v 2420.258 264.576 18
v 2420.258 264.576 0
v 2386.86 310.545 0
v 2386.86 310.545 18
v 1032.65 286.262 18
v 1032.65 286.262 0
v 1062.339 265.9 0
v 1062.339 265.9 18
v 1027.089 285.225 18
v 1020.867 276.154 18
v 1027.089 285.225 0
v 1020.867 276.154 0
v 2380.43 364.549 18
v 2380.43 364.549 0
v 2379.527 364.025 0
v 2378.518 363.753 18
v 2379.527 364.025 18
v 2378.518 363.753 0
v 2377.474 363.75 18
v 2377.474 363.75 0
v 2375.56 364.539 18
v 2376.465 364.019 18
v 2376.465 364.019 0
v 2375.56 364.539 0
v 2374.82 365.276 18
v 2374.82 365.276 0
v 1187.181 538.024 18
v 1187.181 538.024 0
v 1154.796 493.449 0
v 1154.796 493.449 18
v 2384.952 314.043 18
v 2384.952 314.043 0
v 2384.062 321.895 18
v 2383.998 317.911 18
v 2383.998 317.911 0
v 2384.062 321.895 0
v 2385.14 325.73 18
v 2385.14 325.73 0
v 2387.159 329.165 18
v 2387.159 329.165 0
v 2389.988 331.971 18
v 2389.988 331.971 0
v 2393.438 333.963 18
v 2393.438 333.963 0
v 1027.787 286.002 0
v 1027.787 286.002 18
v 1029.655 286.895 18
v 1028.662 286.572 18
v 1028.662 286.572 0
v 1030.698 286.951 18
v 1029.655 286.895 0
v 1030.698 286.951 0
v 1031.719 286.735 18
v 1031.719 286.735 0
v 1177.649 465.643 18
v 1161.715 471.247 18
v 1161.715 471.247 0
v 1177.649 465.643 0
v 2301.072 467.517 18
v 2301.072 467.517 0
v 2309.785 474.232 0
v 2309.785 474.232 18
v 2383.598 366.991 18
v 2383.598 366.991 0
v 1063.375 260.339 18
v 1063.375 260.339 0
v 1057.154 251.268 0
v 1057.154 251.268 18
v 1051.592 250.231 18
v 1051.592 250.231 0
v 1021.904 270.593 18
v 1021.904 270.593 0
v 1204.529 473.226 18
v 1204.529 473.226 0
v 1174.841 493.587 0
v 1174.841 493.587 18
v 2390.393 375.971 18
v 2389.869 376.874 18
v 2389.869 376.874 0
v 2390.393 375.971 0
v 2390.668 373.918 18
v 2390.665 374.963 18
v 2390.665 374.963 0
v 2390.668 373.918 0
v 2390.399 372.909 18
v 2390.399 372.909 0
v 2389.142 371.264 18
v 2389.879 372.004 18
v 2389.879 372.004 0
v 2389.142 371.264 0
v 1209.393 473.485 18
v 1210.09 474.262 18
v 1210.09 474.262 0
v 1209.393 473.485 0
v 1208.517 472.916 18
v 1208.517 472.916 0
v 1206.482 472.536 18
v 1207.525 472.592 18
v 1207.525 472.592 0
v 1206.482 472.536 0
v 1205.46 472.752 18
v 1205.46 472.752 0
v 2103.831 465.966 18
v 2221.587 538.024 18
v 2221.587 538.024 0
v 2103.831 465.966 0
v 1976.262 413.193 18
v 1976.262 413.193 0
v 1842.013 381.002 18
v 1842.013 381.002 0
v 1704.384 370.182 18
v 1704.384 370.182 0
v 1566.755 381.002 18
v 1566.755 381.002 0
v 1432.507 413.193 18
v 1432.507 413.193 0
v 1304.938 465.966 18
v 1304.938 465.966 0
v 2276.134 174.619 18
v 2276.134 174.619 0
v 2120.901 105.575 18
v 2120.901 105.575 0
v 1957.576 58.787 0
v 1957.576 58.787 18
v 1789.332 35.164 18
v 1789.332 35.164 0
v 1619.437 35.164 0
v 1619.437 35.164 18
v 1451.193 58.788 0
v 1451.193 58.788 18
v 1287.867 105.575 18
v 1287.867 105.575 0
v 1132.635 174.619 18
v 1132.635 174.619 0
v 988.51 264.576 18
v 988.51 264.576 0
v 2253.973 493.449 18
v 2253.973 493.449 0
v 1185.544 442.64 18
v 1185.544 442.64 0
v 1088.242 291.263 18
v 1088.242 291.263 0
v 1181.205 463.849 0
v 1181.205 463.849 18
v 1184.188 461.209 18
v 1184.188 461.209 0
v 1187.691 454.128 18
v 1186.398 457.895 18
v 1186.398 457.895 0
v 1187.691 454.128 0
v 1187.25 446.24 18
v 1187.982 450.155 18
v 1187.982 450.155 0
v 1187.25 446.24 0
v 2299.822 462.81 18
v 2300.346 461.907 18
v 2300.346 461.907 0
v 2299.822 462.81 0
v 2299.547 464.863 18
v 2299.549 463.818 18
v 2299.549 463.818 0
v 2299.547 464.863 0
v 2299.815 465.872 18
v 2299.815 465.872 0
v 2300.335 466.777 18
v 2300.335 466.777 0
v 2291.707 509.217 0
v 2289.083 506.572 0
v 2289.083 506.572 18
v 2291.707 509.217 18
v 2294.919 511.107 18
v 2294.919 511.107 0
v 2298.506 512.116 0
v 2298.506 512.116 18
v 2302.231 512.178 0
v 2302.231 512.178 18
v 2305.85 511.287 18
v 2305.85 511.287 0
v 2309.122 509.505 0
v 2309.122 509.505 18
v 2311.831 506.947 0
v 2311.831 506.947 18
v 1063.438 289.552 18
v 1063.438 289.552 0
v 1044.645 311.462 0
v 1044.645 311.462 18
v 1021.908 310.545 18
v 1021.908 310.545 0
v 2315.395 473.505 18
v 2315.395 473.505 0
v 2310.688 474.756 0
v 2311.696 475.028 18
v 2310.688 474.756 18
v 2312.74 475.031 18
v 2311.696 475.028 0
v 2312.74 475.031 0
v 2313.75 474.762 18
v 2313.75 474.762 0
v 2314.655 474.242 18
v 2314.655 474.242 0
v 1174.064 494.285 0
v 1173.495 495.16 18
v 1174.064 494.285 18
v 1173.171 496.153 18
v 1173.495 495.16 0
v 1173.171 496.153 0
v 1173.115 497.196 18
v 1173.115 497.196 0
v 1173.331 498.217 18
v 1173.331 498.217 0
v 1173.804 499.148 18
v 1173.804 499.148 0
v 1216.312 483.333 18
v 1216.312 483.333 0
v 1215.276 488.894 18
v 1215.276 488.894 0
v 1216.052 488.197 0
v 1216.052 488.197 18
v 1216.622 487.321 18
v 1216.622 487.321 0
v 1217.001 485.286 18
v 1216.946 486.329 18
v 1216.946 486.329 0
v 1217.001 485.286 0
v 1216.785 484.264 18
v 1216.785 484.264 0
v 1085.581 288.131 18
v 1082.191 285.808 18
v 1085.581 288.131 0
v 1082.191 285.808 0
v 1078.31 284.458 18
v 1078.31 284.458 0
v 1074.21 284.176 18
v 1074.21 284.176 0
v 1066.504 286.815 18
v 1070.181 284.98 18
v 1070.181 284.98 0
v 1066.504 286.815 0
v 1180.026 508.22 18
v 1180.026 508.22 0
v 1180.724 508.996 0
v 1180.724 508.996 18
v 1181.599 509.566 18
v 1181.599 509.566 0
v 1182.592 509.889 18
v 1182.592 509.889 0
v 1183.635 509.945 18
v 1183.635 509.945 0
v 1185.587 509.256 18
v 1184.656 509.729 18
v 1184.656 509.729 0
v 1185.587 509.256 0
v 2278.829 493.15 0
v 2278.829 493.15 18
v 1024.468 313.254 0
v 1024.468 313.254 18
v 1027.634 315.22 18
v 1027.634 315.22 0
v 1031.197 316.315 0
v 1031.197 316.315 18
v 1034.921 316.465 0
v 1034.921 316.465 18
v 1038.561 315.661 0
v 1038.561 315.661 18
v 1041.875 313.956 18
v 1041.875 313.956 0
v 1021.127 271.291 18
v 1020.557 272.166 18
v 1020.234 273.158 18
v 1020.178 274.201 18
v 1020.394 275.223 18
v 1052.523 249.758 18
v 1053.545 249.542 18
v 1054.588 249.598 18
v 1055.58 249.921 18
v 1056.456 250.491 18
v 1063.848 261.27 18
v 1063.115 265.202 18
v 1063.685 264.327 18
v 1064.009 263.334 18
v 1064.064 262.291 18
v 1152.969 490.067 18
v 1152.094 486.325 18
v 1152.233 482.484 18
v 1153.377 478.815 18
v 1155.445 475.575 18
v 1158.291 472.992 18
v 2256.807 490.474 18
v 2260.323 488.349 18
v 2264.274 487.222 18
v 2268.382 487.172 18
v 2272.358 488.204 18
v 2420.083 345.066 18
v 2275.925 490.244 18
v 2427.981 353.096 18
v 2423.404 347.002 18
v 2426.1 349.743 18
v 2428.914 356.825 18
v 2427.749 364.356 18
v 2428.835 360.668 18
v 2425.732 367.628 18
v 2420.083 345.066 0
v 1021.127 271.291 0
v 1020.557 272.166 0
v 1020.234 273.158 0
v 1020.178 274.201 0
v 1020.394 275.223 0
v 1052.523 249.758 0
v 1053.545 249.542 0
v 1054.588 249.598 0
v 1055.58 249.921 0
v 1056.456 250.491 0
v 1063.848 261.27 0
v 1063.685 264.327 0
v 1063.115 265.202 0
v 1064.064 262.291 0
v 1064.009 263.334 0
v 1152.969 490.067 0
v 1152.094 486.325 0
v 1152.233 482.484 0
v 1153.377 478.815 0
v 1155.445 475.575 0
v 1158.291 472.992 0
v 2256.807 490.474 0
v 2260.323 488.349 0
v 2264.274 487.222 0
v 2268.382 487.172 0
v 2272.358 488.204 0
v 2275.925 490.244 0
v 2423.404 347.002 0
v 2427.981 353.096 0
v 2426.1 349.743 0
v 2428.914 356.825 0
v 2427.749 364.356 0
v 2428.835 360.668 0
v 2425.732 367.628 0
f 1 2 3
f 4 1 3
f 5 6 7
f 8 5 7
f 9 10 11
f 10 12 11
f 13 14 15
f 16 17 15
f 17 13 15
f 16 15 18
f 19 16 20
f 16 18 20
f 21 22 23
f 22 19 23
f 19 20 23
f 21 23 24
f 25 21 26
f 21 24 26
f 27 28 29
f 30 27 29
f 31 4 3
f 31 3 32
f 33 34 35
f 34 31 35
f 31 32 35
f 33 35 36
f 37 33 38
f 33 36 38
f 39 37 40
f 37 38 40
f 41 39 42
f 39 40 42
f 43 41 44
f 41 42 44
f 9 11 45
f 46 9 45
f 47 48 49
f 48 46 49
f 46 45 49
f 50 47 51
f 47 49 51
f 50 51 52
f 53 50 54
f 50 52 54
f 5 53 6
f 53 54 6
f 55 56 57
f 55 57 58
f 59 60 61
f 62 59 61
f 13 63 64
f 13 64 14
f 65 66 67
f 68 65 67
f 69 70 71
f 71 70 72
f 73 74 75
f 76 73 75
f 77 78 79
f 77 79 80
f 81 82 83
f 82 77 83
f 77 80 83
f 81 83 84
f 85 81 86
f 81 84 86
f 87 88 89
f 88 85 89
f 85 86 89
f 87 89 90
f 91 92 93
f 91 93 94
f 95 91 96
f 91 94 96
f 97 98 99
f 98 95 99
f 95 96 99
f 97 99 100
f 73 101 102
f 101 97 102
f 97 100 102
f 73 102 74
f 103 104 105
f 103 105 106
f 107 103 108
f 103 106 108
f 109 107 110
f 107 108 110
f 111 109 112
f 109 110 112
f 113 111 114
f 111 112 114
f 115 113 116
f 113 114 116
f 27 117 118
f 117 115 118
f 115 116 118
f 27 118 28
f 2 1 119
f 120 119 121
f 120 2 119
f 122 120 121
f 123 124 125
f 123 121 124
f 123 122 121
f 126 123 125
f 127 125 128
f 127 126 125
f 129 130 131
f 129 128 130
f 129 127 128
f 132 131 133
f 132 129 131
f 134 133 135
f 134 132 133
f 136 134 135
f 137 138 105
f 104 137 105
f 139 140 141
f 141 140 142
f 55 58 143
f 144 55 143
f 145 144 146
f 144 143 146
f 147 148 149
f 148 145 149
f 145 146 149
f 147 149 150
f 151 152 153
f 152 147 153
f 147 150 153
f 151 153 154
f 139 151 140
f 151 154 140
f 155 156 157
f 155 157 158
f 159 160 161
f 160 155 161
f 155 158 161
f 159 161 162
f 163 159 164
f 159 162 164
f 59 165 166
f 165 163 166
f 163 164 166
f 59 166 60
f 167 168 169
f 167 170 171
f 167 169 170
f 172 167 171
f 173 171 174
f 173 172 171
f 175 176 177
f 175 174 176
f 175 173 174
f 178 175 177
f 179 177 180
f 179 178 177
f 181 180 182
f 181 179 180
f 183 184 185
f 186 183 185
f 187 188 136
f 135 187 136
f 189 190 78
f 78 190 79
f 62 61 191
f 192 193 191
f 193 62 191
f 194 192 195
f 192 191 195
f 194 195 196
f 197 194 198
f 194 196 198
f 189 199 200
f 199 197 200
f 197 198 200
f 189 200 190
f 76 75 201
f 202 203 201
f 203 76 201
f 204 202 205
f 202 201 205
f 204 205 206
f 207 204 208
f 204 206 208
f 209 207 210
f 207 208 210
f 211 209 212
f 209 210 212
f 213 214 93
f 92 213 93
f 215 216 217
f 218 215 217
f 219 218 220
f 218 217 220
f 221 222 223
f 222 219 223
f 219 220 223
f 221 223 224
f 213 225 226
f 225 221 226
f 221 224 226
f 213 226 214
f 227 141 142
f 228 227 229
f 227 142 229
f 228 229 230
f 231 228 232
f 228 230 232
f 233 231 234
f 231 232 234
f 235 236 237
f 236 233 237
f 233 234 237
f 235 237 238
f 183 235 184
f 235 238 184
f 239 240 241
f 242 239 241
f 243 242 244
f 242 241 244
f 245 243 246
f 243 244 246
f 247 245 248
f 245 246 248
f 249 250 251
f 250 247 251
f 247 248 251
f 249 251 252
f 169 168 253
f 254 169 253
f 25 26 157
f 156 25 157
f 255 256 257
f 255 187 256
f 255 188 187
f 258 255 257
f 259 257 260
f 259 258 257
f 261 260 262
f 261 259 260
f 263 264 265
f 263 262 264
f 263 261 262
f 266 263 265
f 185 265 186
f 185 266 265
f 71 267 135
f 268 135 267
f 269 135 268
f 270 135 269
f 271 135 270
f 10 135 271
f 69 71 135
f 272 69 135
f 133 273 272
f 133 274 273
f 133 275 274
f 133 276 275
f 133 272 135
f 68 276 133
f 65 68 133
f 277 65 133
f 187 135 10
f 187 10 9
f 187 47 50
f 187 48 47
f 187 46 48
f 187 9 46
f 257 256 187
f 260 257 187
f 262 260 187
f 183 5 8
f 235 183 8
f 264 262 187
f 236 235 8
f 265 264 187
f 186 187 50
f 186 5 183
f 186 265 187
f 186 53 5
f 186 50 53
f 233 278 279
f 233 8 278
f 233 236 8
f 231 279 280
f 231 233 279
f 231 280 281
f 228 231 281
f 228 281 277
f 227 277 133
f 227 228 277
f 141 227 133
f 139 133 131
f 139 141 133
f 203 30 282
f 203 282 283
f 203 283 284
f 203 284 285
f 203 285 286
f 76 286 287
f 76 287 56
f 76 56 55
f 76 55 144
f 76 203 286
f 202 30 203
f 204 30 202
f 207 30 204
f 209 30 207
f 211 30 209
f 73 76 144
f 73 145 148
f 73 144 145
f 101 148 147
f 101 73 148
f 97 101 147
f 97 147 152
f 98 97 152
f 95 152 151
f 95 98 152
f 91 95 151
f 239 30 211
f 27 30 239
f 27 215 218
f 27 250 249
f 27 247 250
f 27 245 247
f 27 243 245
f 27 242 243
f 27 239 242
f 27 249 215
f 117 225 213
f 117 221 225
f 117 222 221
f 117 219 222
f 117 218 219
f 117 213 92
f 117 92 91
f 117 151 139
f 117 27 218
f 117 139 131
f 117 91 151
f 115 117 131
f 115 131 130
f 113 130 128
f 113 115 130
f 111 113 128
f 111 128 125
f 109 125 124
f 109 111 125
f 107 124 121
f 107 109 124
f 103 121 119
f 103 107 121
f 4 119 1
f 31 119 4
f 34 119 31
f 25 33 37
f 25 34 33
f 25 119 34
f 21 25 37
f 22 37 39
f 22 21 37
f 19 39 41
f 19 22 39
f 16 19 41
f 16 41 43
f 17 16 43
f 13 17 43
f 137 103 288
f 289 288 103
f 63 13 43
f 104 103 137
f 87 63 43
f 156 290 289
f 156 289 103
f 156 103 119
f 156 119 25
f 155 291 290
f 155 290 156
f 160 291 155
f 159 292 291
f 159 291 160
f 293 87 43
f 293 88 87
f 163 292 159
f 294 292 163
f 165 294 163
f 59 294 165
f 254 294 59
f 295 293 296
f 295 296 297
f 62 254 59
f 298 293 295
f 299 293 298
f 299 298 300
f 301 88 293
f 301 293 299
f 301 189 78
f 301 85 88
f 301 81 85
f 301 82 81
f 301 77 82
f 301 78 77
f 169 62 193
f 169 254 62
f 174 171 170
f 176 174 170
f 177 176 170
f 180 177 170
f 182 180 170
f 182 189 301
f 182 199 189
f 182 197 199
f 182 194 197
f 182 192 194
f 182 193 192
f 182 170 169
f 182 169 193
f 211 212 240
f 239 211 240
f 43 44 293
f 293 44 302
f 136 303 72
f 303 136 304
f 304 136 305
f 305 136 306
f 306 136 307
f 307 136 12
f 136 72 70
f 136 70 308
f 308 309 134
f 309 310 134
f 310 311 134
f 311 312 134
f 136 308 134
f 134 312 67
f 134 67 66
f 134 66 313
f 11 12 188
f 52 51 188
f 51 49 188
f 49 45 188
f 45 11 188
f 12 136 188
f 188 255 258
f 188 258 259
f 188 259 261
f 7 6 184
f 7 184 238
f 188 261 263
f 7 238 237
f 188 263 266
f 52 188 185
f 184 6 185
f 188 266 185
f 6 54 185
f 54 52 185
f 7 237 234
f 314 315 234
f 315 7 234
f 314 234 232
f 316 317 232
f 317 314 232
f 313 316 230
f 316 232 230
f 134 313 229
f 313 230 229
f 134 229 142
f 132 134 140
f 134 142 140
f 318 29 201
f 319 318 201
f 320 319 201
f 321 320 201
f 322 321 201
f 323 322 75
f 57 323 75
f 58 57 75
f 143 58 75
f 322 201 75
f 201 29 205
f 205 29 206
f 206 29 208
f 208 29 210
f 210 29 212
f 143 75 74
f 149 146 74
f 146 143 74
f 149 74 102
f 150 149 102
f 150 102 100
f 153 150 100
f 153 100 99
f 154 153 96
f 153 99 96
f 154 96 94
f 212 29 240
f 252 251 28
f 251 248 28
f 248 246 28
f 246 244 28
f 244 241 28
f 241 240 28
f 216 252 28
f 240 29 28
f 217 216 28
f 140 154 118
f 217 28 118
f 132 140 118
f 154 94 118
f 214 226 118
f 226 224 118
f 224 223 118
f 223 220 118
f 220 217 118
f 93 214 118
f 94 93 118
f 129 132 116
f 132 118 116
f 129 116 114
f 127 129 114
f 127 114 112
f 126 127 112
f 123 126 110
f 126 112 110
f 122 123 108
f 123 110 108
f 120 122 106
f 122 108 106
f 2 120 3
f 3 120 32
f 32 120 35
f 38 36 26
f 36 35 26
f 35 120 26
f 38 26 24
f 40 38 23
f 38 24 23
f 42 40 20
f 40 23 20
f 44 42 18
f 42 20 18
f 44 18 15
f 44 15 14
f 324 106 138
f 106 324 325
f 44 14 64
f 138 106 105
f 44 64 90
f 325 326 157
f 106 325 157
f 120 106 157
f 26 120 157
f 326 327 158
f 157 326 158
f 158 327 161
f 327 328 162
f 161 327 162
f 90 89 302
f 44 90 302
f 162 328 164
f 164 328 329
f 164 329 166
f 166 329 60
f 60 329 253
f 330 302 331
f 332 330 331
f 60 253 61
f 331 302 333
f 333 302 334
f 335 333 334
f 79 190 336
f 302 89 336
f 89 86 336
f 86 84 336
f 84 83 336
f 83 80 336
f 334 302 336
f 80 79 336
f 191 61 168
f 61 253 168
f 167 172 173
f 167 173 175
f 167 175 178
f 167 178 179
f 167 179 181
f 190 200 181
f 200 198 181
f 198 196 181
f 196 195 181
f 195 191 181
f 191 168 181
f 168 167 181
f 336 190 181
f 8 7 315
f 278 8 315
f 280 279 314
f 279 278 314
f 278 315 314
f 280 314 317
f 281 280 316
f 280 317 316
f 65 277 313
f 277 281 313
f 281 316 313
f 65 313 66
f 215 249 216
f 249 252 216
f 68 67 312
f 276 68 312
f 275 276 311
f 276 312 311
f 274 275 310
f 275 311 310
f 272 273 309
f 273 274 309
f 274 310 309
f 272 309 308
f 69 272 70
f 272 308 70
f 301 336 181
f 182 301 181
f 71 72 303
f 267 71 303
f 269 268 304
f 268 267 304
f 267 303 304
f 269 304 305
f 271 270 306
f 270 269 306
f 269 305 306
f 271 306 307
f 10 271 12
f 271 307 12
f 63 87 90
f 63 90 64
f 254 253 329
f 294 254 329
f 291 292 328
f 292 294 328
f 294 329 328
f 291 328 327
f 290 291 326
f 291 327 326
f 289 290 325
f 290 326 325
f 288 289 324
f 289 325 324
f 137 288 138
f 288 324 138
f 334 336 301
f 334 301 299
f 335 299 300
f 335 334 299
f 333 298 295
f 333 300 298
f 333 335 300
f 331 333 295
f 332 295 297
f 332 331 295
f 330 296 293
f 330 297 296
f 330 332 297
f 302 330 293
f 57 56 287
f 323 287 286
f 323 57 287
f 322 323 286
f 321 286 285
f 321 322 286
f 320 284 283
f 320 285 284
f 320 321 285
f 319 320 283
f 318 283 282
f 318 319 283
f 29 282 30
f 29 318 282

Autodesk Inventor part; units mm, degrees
ref_plane "YZ Plane" through (0, 0, 0) normal (1, 0, 0) x (0, 1, 0)
ref_plane "XZ Plane" through (0, 0, 0) normal (0, 1, 0) x (-1, 0, 0)
ref_plane "XY Plane" through (0, 0, 0) normal (0, 0, 1) x (1, 0, 0)
sketch "CONTOURS" plane through (0, 0, 0) normal (0, 0, 1) x (1, 0, 0)
  line L0 (1187.1814, 538.0239) -> (1154.7956, 493.4487)
  arc A0 (1154.7956, 493.4487) -> (1161.7152, 471.2473) centre (1166.5264, 484.9258) ccw
  line L1 (1161.7152, 471.2473) -> (1177.6489, 465.6429)
  arc A1 (1185.5445, 442.6399) -> (1177.6489, 465.6429) centre (1172.5058, 451.021) ccw
  line L2 (1185.5445, 442.6399) -> (1088.242, 291.2628)
  arc A2 (1063.4384, 289.5524) -> (1088.242, 291.2628) centre (1075.2033, 299.6438) ccw
  line L3 (1063.4384, 289.5524) -> (1044.645, 311.4625)
  arc A3 (1044.645, 311.4625) -> (1021.9083, 310.545) centre (1033.6391, 302.0221) ccw
  line L4 (1021.9083, 310.545) -> (988.51, 264.5762)
  arc A4 (988.51, 264.5762) -> (2420.2584, 264.576) centre (1704.3843, 1251.0758) ccw
  line L5 (2420.2584, 264.576) -> (2386.86, 310.545)
  arc A5 (2393.4378, 333.9632) -> (2386.86, 310.545) centre (2399.3997, 319.6557) ccw
  line L6 (2393.4378, 333.9632) -> (2420.083, 345.0663)
  arc A6 (2420.083, 345.0663) -> (2425.7316, 367.6284) centre (2414.5057, 358.4507) ccw
  line L7 (2425.7316, 367.6284) -> (2311.8314, 506.9467)
  arc A7 (2311.8314, 506.9467) -> (2289.0833, 506.5717) centre (2300.6056, 497.769) ccw
  line L8 (2289.0833, 506.5717) -> (2278.8294, 493.1497)
  arc A8 (2253.9726, 493.4487) -> (2278.8294, 493.1497) centre (2266.5124, 502.5594) ccw
  line L9 (2253.9726, 493.4487) -> (2221.5869, 538.0239)
  arc A9 (1187.1814, 538.0239) -> (2221.5869, 538.0239) centre (1704.3841, 1250.9821) ccw
sketch "HOLES" plane through (0, 0, 0) normal (0, 0, 1) x (1, 0, 0)
  arc A0 (1185.5871, 509.2559) -> (1180.0259, 508.2196) centre (1183.3247, 505.9572) ccw
  line L0 (1185.5871, 509.2559) -> (1215.2756, 488.8945)
  arc A1 (1216.312, 483.3334) -> (1215.2756, 488.8945) centre (1213.0133, 485.5957) ccw
  line L1 (1216.312, 483.3334) -> (1210.0905, 474.2619)
  arc A2 (1204.5293, 473.2255) -> (1210.0905, 474.2619) centre (1206.7917, 476.5242) ccw
  line L2 (1204.5293, 473.2255) -> (1174.8407, 493.5869)
  arc A3 (1173.8044, 499.148) -> (1174.8407, 493.5869) centre (1177.1031, 496.8857) ccw
  line L3 (2383.598, 366.9908) -> (2380.4297, 364.5491)
  arc A4 (2374.8197, 365.2756) -> (2380.4297, 364.5491) centre (2377.988, 367.7173) ccw
  line L4 (2374.8197, 365.2756) -> (2300.3458, 461.907)
  arc A5 (2301.0723, 467.5171) -> (2300.3458, 461.907) centre (2303.5141, 464.3488) ccw
  line L5 (2301.0723, 467.5171) -> (2309.785, 474.2319)
  arc A6 (2315.395, 473.5054) -> (2309.785, 474.2319) centre (2312.2268, 471.0637) ccw
  line L6 (2315.395, 473.5054) -> (2389.8689, 376.874)
  arc A7 (2389.1424, 371.2639) -> (2389.8689, 376.874) centre (2386.7006, 374.4322) ccw
  line L7 (2389.1424, 371.2639) -> (2383.598, 366.9908)
  line L8 (1063.375, 260.339) -> (1057.1535, 251.2675)
  arc A8 (1051.5924, 250.2312) -> (1057.1535, 251.2675) centre (1053.8548, 253.5299) ccw
  line L9 (1051.5924, 250.2312) -> (1021.9038, 270.5926)
  arc A9 (1020.8674, 276.1537) -> (1021.9038, 270.5926) centre (1024.1662, 273.8913) ccw
  line L10 (1020.8674, 276.1537) -> (1027.089, 285.2252)
  arc A10 (1032.6501, 286.2616) -> (1027.089, 285.2252) centre (1030.3877, 282.9628) ccw
  line L11 (1032.6501, 286.2616) -> (1062.3387, 265.9002)
  arc A11 (1063.375, 260.339) -> (1062.3387, 265.9002) centre (1060.0763, 262.6014) ccw
  line L12 (1173.8044, 499.148) -> (1180.0259, 508.2196)
sketch "LETTERS" plane through (0, 0, 0) normal (0, 0, 1) x (1, 0, 0)
  line L0 (1208.7696, 324.759) -> (1209.0033, 324.7372)
  line L1 (1209.0033, 324.7372) -> (1209.2368, 324.7098)
  line L2 (1209.2368, 324.7098) -> (1209.4699, 324.6767)
  line L3 (1209.4699, 324.6767) -> (1209.7026, 324.638)
  line L4 (1209.7026, 324.638) -> (1209.9347, 324.5939)
  line L5 (1209.9347, 324.5939) -> (1210.166, 324.5444)
  line L6 (1210.166, 324.5444) -> (1210.3965, 324.4896)
  line L7 (1210.3965, 324.4896) -> (1210.6261, 324.4296)
  line L8 (1210.6261, 324.4296) -> (1210.8547, 324.3644)
  line L9 (1210.8547, 324.3644) -> (1211.082, 324.294)
  line L10 (1211.082, 324.294) -> (1211.3081, 324.2187)
  line L11 (1211.3081, 324.2187) -> (1211.5327, 324.1384)
  line L12 (1211.5327, 324.1384) -> (1211.7559, 324.0533)
  line L13 (1211.7559, 324.0533) -> (1211.9774, 323.9634)
  line L14 (1211.9774, 323.9634) -> (1212.1971, 323.8687)
  line L15 (1212.1971, 323.8687) -> (1212.415, 323.7694)
  line L16 (1212.415, 323.7694) -> (1212.6308, 323.6655)
  line L17 (1212.6308, 323.6655) -> (1212.8446, 323.5572)
  line L18 (1212.8446, 323.5572) -> (1213.0562, 323.4444)
  line L19 (1213.0562, 323.4444) -> (1213.2655, 323.3273)
  line L20 (1213.2655, 323.3273) -> (1213.4724, 323.2058)
  line L21 (1213.4724, 323.2058) -> (1213.6769, 323.0802)
  line L22 (1213.6769, 323.0802) -> (1213.8789, 322.9504)
  line L23 (1213.8789, 322.9504) -> (1214.0783, 322.8166)
  line L24 (1214.0783, 322.8166) -> (1214.275, 322.6787)
  line L25 (1214.275, 322.6787) -> (1214.469, 322.5369)
  line L26 (1214.469, 322.5369) -> (1214.6601, 322.3913)
  line L27 (1214.6601, 322.3913) -> (1214.8483, 322.2419)
  line L28 (1214.8483, 322.2419) -> (1215.0335, 322.0887)
  line L29 (1215.0335, 322.0887) -> (1215.2156, 321.9319)
  line L30 (1215.2156, 321.9319) -> (1215.3946, 321.7715)
  line L31 (1215.3946, 321.7715) -> (1215.5703, 321.6076)
  line L32 (1215.5703, 321.6076) -> (1215.7426, 321.4402)
  line L33 (1215.7426, 321.4402) -> (1215.9116, 321.2695)
  line L34 (1215.9116, 321.2695) -> (1216.0771, 321.0955)
  line L35 (1216.0771, 321.0955) -> (1216.2389, 320.9182)
  line L36 (1216.2389, 320.9182) -> (1216.3972, 320.7378)
  line L37 (1216.3972, 320.7378) -> (1216.5517, 320.5543)
  line L38 (1216.5517, 320.5543) -> (1216.7024, 320.3678)
  line L39 (1216.7024, 320.3678) -> (1216.8491, 320.1783)
  line L40 (1216.8491, 320.1783) -> (1216.9919, 319.9859)
  line L41 (1216.9919, 319.9859) -> (1217.1307, 319.7908)
  line L42 (1217.1307, 319.7908) -> (1217.2653, 319.5929)
  line L43 (1217.2653, 319.5929) -> (1217.3956, 319.3923)
  line L44 (1217.3956, 319.3923) -> (1217.5217, 319.1891)
  line L45 (1217.5217, 319.1891) -> (1217.6434, 318.9834)
  line L46 (1217.6434, 318.9834) -> (1217.7606, 318.7752)
  line L47 (1217.7606, 318.7752) -> (1217.8733, 318.5647)
  line L48 (1217.8733, 318.5647) -> (1217.9813, 318.3518)
  line L49 (1217.9813, 318.3518) -> (1218.0846, 318.1367)
  line L50 (1218.0846, 318.1367) -> (1218.1832, 317.9195)
  line L51 (1218.1832, 317.9195) -> (1218.2769, 317.7002)
  line L52 (1218.2769, 317.7002) -> (1218.3657, 317.4791)
  line L53 (1218.3657, 317.4791) -> (1218.4496, 317.2562)
  line L54 (1218.4496, 317.2562) -> (1218.5286, 317.0317)
  line L55 (1218.5286, 317.0317) -> (1218.6024, 316.8056)
  line L56 (1218.6024, 316.8056) -> (1218.6712, 316.5781)
  line L57 (1218.6712, 316.5781) -> (1218.7348, 316.3494)
  line L58 (1218.7348, 316.3494) -> (1218.7932, 316.1195)
  line L59 (1218.7932, 316.1195) -> (1218.8464, 315.8885)
  line L60 (1218.8464, 315.8885) -> (1218.8942, 315.6566)
  line L61 (1218.8942, 315.6566) -> (1218.9366, 315.424)
  line L62 (1218.9366, 315.424) -> (1218.9736, 315.1906)
  line L63 (1218.9736, 315.1906) -> (1219.0051, 314.9567)
  line L64 (1219.0051, 314.9567) -> (1219.031, 314.7224)
  line L65 (1219.031, 314.7224) -> (1219.0514, 314.4877)
  line L66 (1219.0514, 314.4877) -> (1219.0661, 314.2529)
  line L67 (1219.0661, 314.2529) -> (1219.0751, 314.0179)
  line L68 (1219.0751, 314.0179) -> (1219.0783, 313.783)
  line L69 (1219.0783, 313.783) -> (1219.0757, 313.5483)
  line L70 (1219.0757, 313.5483) -> (1219.0672, 313.3139)
  line L71 (1219.0672, 313.3139) -> (1219.0528, 313.0799)
  line L72 (1219.0528, 313.0799) -> (1219.0324, 312.8464)
  line L73 (1219.0324, 312.8464) -> (1219.0059, 312.6136)
  line L74 (1219.0059, 312.6136) -> (1218.9733, 312.3815)
  line L75 (1218.9733, 312.3815) -> (1218.9346, 312.1503)
  line L76 (1218.9346, 312.1503) -> (1218.8897, 311.9202)
  line L77 (1218.8897, 311.9202) -> (1218.8385, 311.6911)
  line L78 (1218.8385, 311.6911) -> (1218.7809, 311.4634)
  line L79 (1218.7809, 311.4634) -> (1218.717, 311.237)
  line L80 (1218.717, 311.237) -> (1218.6466, 311.0121)
  line L81 (1218.6466, 311.0121) -> (1218.5698, 310.7888)
  line L82 (1218.5698, 310.7888) -> (1218.4866, 310.5673)
  line L83 (1218.4866, 310.5673) -> (1218.3972, 310.3477)
  line L84 (1218.3972, 310.3477) -> (1218.3016, 310.1302)
  line L85 (1218.3016, 310.1302) -> (1218.2, 309.9149)
  line L86 (1218.2, 309.9149) -> (1218.0925, 309.7021)
  line L87 (1218.0925, 309.7021) -> (1217.9793, 309.4917)
  line L88 (1217.9793, 309.4917) -> (1217.8604, 309.2841)
  line L89 (1217.8604, 309.2841) -> (1217.7359, 309.0793)
  line L90 (1217.7359, 309.0793) -> (1217.6061, 308.8776)
  line L91 (1217.6061, 308.8776) -> (1217.471, 308.679)
  line L92 (1217.471, 308.679) -> (1217.3307, 308.4837)
  line L93 (1217.3307, 308.4837) -> (1217.1853, 308.2919)
  line L94 (1217.1853, 308.2919) -> (1217.035, 308.1038)
  line L95 (1217.035, 308.1038) -> (1216.8799, 307.9194)
  line L96 (1216.8799, 307.9194) -> (1216.7202, 307.739)
  line L97 (1216.7202, 307.739) -> (1216.5558, 307.5626)
  line L98 (1216.5558, 307.5626) -> (1216.3871, 307.3906)
  line L99 (1216.3871, 307.3906) -> (1216.214, 307.2229)
  line L100 (1216.214, 307.2229) -> (1216.0366, 307.0598)
  line L101 (1216.0366, 307.0598) -> (1215.8552, 306.9014)
  line L102 (1215.8552, 306.9014) -> (1215.6699, 306.7478)
  line L103 (1215.6699, 306.7478) -> (1215.4807, 306.5993)
  line L104 (1215.4807, 306.5993) -> (1215.2878, 306.456)
  line L105 (1215.2878, 306.456) -> (1215.0912, 306.318)
  line L106 (1215.0912, 306.318) -> (1214.8912, 306.1855)
  line L107 (1214.8912, 306.1855) -> (1214.6878, 306.0587)
  line L108 (1214.6878, 306.0587) -> (1214.4812, 305.9377)
  line L109 (1214.4812, 305.9377) -> (1214.2715, 305.8226)
  line L110 (1214.2715, 305.8226) -> (1214.0588, 305.7136)
  line L111 (1214.0588, 305.7136) -> (1213.8431, 305.6109)
  line L112 (1213.8431, 305.6109) -> (1213.6248, 305.5146)
  line L113 (1213.6248, 305.5146) -> (1213.4038, 305.4249)
  line L114 (1213.4038, 305.4249) -> (1213.1803, 305.3417)
  line L115 (1213.1803, 305.3417) -> (1212.9546, 305.2653)
  line L116 (1212.9546, 305.2653) -> (1212.7269, 305.1955)
  line L117 (1212.7269, 305.1955) -> (1212.4974, 305.1324)
  line L118 (1212.4974, 305.1324) -> (1212.2662, 305.0761)
  line L119 (1212.2662, 305.0761) -> (1212.0336, 305.0266)
  line L120 (1212.0336, 305.0266) -> (1211.7997, 304.984)
  line L121 (1211.7997, 304.984) -> (1211.5648, 304.9482)
  line L122 (1211.5648, 304.9482) -> (1211.3291, 304.9193)
  line L123 (1211.3291, 304.9193) -> (1211.0928, 304.8974)
  line L124 (1211.0928, 304.8974) -> (1210.856, 304.8825)
  line L125 (1210.856, 304.8825) -> (1210.6191, 304.8745)
  line L126 (1210.6191, 304.8745) -> (1210.382, 304.8736)
  line L127 (1210.382, 304.8736) -> (1210.1452, 304.8798)
  line L128 (1210.1452, 304.8798) -> (1209.9088, 304.8931)
  line L129 (1209.9088, 304.8931) -> (1209.6729, 304.9136)
  line L130 (1209.6729, 304.9136) -> (1209.4378, 304.9413)
  line L131 (1209.4378, 304.9413) -> (1209.2037, 304.9762)
  line L132 (1209.2037, 304.9762) -> (1208.9708, 305.0183)
  line L133 (1208.9708, 305.0183) -> (1208.7392, 305.0678)
  line L134 (1208.7392, 305.0678) -> (1208.5093, 305.1246)
  line L135 (1208.5093, 305.1246) -> (1208.2811, 305.1888)
  line L136 (1208.2811, 305.1888) -> (1208.0549, 305.2604)
  line L137 (1208.0549, 305.2604) -> (1207.831, 305.3394)
  line L138 (1207.831, 305.3394) -> (1207.6094, 305.4259)
  line L139 (1207.6094, 305.4259) -> (1207.3904, 305.52)
  line L140 (1207.3904, 305.52) -> (1207.1741, 305.6215)
  line L141 (1207.1741, 305.6215) -> (1206.9609, 305.7306)
  line L142 (1206.9609, 305.7306) -> (1206.7508, 305.8474)
  line L143 (1206.7508, 305.8474) -> (1206.5442, 305.9718)
  line L144 (1206.5442, 305.9718) -> (1206.4422, 306.0369)
  line L145 (1206.4422, 306.0369) -> (1206.3411, 306.1039)
  line L146 (1200.6132, 311.8395) -> (1200.4954, 312.0474)
  line L147 (1200.4954, 312.0474) -> (1200.3834, 312.2585)
  line L148 (1200.3834, 312.2585) -> (1200.2774, 312.4725)
  line L149 (1200.2774, 312.4725) -> (1200.1773, 312.6893)
  line L150 (1200.1773, 312.6893) -> (1200.0833, 312.9088)
  line L151 (1200.0833, 312.9088) -> (1199.9953, 313.1306)
  line L152 (1199.9953, 313.1306) -> (1199.9133, 313.3547)
  line L153 (1199.9133, 313.3547) -> (1199.8375, 313.5809)
  line L154 (1199.8375, 313.5809) -> (1199.7678, 313.809)
  line L155 (1199.7678, 313.809) -> (1199.7043, 314.0389)
  line L156 (1199.7043, 314.0389) -> (1199.647, 314.2703)
  line L157 (1199.647, 314.2703) -> (1199.596, 314.5031)
  line L158 (1199.596, 314.5031) -> (1199.5512, 314.7371)
  line L159 (1199.5512, 314.7371) -> (1199.5127, 314.9721)
  line L160 (1199.5127, 314.9721) -> (1199.4806, 315.208)
  line L161 (1199.4806, 315.208) -> (1199.4549, 315.4446)
  line L162 (1199.4549, 315.4446) -> (1199.4356, 315.6817)
  line L163 (1199.4356, 315.6817) -> (1199.4228, 315.9191)
  line L164 (1199.4228, 315.9191) -> (1199.4164, 316.1567)
  line L165 (1199.4164, 316.1567) -> (1199.4166, 316.3943)
  line L166 (1199.4166, 316.3943) -> (1199.4234, 316.6317)
  line L167 (1199.4234, 316.6317) -> (1199.4367, 316.8687)
  line L168 (1199.4367, 316.8687) -> (1199.4567, 317.1052)
  line L169 (1199.4567, 317.1052) -> (1199.4833, 317.341)
  line L170 (1199.4833, 317.341) -> (1199.5167, 317.5759)
  line L171 (1199.5167, 317.5759) -> (1199.5568, 317.8098)
  line L172 (1199.5568, 317.8098) -> (1199.6036, 318.0424)
  line L173 (1199.6036, 318.0424) -> (1199.6573, 318.2736)
  line L174 (1199.6573, 318.2736) -> (1199.7178, 318.5032)
  line L175 (1199.7178, 318.5032) -> (1199.7852, 318.731)
  line L176 (1199.7852, 318.731) -> (1199.8595, 318.9569)
  line L177 (1199.8595, 318.9569) -> (1199.9408, 319.1808)
  line L178 (1199.9408, 319.1808) -> (1200.029, 319.4023)
  line L179 (1200.029, 319.4023) -> (1200.124, 319.6214)
  line L180 (1200.124, 319.6214) -> (1200.2257, 319.8379)
  line L181 (1200.2257, 319.8379) -> (1200.3338, 320.0517)
  line L182 (1200.3338, 320.0517) -> (1200.4483, 320.2627)
  line L183 (1200.4483, 320.2627) -> (1200.5689, 320.4706)
  line L184 (1200.5689, 320.4706) -> (1200.6955, 320.6754)
  line L185 (1200.6955, 320.6754) -> (1200.8279, 320.8769)
  line L186 (1200.8279, 320.8769) -> (1200.966, 321.075)
  line L187 (1200.966, 321.075) -> (1201.1095, 321.2695)
  line L188 (1201.1095, 321.2695) -> (1201.2584, 321.4603)
  line L189 (1201.2584, 321.4603) -> (1201.4123, 321.6472)
  line L190 (1201.4123, 321.6472) -> (1201.5713, 321.8301)
  line L191 (1201.5713, 321.8301) -> (1201.7351, 322.0088)
  line L192 (1201.7351, 322.0088) -> (1201.9035, 322.1833)
  line L193 (1201.9035, 322.1833) -> (1202.0764, 322.3533)
  line L194 (1202.0764, 322.3533) -> (1202.2535, 322.5187)
  line L195 (1202.2535, 322.5187) -> (1202.4349, 322.6794)
  line L196 (1202.4349, 322.6794) -> (1202.6202, 322.8352)
  line L197 (1202.6202, 322.8352) -> (1202.8093, 322.986)
  line L198 (1202.8093, 322.986) -> (1203.002, 323.1317)
  line L199 (1203.002, 323.1317) -> (1203.1982, 323.272)
  line L200 (1203.1982, 323.272) -> (1203.3977, 323.4069)
  line L201 (1203.3977, 323.4069) -> (1203.6004, 323.5362)
  line L202 (1203.6004, 323.5362) -> (1203.806, 323.6598)
  line L203 (1203.806, 323.6598) -> (1204.0144, 323.7774)
  line L204 (1204.0144, 323.7774) -> (1204.2254, 323.8891)
  line L205 (1204.2254, 323.8891) -> (1204.4389, 323.9946)
  line L206 (1204.4389, 323.9946) -> (1204.6547, 324.0938)
  line L207 (1204.6547, 324.0938) -> (1204.8726, 324.1865)
  line L208 (1204.8726, 324.1865) -> (1205.0925, 324.2727)
  line L209 (1205.0925, 324.2727) -> (1205.3142, 324.352)
  line L210 (1205.3142, 324.352) -> (1205.5375, 324.4246)
  line L211 (1205.5375, 324.4246) -> (1205.7624, 324.4903)
  line L212 (1205.7624, 324.4903) -> (1205.9886, 324.5493)
  line L213 (1205.9886, 324.5493) -> (1206.2161, 324.6016)
  line L214 (1206.2161, 324.6016) -> (1206.4448, 324.6474)
  line L215 (1206.4448, 324.6474) -> (1206.6745, 324.6866)
  line L216 (1206.6745, 324.6866) -> (1206.9051, 324.7194)
  line L217 (1206.9051, 324.7194) -> (1207.1366, 324.7459)
  line L218 (1207.1366, 324.7459) -> (1207.3687, 324.766)
  line L219 (1208.5357, 324.775) -> (1208.7696, 324.759)
  line L220 (1207.6014, 324.7799) -> (1207.8346, 324.7877)
  line L221 (1207.8346, 324.7877) -> (1208.0681, 324.7895)
  line L222 (1208.0681, 324.7895) -> (1208.3019, 324.7852)
  line L223 (1208.3019, 324.7852) -> (1208.5357, 324.775)
  line L224 (1207.3687, 324.766) -> (1207.6014, 324.7799)
extrude "Extrusion2" add sketch "CONTOURS" along normal blind 18
extrude "Extrusion3" cut sketch "HOLES" along normal blind 18
properties part number "Platform C2" material "Wood (Birch)"
